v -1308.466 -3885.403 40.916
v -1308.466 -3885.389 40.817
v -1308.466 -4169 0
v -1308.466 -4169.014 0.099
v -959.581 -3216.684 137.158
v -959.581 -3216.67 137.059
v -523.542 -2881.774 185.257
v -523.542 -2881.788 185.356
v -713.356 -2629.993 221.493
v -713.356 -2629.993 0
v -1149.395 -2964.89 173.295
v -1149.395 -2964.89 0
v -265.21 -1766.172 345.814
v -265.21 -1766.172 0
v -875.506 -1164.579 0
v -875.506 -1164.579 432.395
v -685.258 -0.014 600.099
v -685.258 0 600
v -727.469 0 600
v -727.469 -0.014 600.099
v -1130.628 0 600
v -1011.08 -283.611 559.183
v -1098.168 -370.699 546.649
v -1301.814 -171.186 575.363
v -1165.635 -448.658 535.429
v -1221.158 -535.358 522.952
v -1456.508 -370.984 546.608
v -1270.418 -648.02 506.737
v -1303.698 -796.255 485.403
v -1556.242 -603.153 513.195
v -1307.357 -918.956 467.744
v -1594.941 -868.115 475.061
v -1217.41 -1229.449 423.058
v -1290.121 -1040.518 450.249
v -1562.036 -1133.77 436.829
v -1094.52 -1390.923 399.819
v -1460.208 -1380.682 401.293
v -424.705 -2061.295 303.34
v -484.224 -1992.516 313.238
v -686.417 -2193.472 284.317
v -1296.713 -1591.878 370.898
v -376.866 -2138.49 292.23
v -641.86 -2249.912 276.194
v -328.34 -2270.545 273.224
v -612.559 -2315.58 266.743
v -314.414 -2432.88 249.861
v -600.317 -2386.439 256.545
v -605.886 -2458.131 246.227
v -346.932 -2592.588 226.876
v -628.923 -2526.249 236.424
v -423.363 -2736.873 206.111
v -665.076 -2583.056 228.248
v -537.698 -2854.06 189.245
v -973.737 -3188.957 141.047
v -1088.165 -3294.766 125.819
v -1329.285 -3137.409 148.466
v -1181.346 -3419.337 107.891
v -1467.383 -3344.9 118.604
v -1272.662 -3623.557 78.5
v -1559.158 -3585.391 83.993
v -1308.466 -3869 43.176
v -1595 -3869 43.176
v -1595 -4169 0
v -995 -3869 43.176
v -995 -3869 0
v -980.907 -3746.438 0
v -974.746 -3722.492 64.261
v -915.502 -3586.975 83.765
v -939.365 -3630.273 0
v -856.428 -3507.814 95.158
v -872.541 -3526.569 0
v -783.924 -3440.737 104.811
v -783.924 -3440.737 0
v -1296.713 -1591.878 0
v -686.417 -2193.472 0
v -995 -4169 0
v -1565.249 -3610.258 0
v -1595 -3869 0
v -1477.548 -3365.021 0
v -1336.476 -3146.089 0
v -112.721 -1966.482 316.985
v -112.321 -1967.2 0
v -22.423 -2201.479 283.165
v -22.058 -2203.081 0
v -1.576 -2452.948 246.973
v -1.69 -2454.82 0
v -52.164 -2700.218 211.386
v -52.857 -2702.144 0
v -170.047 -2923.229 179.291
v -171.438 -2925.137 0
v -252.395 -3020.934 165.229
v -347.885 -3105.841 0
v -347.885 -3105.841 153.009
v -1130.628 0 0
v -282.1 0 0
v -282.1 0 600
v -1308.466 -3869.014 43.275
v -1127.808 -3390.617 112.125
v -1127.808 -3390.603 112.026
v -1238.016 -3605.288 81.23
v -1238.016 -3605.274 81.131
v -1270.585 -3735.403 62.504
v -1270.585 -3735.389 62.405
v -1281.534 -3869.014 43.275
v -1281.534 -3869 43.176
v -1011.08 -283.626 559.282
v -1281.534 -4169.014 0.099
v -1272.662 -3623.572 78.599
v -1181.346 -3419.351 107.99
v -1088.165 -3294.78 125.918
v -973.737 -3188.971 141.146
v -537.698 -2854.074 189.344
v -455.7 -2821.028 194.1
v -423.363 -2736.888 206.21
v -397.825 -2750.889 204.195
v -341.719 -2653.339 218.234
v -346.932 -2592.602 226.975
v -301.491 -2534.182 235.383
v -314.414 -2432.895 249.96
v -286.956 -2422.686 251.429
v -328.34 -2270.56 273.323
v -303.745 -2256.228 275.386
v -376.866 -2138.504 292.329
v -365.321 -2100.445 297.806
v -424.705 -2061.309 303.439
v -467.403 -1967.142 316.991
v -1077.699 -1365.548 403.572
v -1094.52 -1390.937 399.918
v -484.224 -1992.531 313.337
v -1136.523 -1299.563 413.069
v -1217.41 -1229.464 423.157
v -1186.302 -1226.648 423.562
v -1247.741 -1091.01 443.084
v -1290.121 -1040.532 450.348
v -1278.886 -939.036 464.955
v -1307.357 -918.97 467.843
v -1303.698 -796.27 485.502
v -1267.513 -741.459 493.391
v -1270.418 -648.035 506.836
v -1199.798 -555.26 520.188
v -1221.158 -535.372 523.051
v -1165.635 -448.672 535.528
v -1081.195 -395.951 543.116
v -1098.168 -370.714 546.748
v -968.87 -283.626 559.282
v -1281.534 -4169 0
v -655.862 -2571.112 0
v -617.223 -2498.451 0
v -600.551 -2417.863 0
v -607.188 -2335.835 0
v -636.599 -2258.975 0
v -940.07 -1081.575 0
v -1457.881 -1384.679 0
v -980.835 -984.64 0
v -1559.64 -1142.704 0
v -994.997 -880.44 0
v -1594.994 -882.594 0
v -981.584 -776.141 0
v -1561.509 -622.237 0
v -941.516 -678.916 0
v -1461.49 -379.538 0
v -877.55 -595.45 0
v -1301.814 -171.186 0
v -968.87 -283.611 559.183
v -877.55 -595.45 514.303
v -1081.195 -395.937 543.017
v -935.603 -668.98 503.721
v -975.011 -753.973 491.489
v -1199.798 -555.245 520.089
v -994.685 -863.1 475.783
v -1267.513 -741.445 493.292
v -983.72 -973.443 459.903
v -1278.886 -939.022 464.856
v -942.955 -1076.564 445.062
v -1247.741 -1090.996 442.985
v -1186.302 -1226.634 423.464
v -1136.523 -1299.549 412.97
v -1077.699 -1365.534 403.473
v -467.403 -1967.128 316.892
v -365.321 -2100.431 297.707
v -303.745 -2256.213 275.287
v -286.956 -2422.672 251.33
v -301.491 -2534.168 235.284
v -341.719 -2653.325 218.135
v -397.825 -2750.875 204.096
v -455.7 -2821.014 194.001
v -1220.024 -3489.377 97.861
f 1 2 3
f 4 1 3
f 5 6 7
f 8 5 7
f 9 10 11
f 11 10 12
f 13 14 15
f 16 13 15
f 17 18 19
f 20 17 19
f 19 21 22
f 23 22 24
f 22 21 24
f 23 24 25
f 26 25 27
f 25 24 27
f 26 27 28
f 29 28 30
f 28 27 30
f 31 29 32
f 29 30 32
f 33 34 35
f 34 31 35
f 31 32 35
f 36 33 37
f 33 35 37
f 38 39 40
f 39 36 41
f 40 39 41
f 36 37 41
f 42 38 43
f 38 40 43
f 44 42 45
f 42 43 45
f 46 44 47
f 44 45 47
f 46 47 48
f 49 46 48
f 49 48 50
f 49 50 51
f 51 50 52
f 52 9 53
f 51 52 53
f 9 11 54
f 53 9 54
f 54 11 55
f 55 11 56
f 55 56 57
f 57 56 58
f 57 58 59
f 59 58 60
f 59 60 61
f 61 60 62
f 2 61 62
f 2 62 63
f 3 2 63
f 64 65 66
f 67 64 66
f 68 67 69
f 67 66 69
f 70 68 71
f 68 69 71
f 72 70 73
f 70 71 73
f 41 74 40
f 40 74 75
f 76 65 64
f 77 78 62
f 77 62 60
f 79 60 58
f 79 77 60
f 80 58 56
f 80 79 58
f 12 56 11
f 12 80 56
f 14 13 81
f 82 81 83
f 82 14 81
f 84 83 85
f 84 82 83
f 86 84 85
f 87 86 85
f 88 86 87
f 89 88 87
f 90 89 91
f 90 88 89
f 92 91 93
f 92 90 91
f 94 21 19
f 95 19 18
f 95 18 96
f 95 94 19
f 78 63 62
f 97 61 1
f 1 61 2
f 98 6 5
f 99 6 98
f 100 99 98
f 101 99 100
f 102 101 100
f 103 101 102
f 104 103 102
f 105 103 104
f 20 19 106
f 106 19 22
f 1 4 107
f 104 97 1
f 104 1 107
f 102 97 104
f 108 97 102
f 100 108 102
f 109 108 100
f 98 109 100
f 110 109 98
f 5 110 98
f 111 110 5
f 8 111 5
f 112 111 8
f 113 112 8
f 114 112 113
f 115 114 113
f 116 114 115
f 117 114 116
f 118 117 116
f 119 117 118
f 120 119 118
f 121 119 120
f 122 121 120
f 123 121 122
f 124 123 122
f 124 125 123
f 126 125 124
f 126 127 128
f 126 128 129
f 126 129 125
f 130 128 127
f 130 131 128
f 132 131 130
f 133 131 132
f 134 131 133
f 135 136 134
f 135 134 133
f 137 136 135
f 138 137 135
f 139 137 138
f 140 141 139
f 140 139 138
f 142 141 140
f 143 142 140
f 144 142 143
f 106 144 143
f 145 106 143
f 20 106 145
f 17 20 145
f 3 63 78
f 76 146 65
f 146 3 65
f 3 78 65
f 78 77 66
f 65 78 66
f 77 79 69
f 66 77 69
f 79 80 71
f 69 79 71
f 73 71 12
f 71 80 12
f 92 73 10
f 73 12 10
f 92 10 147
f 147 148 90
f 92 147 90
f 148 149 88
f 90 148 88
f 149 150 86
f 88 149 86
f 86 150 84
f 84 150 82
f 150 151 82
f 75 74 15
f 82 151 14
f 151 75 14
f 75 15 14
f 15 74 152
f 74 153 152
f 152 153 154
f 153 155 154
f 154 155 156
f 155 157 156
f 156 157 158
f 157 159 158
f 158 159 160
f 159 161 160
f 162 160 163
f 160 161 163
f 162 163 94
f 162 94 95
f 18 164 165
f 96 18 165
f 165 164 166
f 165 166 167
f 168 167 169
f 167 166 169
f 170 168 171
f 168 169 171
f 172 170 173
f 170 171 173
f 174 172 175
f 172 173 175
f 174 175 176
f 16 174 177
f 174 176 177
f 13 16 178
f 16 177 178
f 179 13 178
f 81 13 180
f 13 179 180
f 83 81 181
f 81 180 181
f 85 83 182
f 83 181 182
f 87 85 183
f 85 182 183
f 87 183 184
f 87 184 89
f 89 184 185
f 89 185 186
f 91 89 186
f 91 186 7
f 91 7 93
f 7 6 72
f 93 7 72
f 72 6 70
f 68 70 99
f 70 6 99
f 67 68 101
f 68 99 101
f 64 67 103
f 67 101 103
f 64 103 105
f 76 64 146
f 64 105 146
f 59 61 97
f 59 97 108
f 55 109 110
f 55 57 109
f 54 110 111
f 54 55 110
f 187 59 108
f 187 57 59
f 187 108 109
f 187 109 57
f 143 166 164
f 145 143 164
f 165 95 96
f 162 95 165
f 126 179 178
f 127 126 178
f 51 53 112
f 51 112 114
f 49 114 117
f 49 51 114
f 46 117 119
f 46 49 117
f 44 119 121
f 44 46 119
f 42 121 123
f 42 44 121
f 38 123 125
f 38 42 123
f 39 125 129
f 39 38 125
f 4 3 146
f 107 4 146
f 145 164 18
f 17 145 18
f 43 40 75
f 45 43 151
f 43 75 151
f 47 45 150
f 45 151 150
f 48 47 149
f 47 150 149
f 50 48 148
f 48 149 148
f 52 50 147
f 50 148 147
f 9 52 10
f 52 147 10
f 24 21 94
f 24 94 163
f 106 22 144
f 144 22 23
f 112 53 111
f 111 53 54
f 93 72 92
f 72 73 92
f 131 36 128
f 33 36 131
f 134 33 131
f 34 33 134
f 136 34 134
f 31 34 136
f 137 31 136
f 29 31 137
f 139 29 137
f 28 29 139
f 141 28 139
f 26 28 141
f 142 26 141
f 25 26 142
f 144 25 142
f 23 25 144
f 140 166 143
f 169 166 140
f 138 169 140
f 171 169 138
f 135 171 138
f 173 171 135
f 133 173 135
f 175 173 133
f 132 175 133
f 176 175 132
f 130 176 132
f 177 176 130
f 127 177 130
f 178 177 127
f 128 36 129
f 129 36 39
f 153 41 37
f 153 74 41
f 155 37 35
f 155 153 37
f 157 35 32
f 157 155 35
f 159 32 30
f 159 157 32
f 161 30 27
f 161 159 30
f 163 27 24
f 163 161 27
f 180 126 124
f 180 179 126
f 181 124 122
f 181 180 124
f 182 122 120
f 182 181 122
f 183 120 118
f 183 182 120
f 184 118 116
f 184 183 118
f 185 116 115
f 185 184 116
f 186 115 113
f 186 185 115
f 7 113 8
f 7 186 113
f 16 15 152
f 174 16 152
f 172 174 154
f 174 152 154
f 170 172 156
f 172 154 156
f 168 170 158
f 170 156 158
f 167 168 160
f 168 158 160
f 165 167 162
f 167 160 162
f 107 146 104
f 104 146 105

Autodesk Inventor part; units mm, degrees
ref_plane "YZ Plane" through (0, 0, 0) normal (1, 0, 0) x (0, 1, 0)
ref_plane "XZ Plane" through (0, 0, 0) normal (0, 1, 0) x (-1, 0, 0)
ref_plane "XY Plane" through (0, 0, 0) normal (0, 0, 1) x (1, 0, 0)
sketch "スケッチ1" plane through (0, 0, 0) normal (0, 0, 1) x (1, 0, 0)
  line L0 (1130.627776, 0) -> (1301.813888, -171.186112)
  line L1 (282.099639, 0) -> (877.549819, -595.450181)
  line L2 (1130.627776, 0) -> (282.099639, 0)
  circle A0 centre (594, -879) radius 1001 construction
  arc A1 (1296.712925, -1591.878353) -> (1296.712925, -1591.878353) centre (389.934597, -671.982591) ccw
  line L3 (1296.712925, -1591.878353) -> (686.416835, -2193.471806)
  circle A2 centre (890, -2400) radius 290 construction
  line L4 (713.355666, -2629.992999) -> (1149.394967, -2964.889592)
  line L5 (1595, -4169) -> (1595, -3869)
  circle A3 centre (455, -3869) radius 1140 construction
  arc A4 (875.506376, -1164.578641) -> (877.549819, -595.450181) centre (594, -879) ccw construction
  circle A5 centre (890, -2400) radius 890 construction
  circle A6 centre (455, -3869) radius 540 construction
  line L6 (783.923932, -3440.737175) -> (347.884631, -3105.840582)
  line L7 (265.210287, -1766.172094) -> (875.506376, -1164.578641)
  line L8 (995, -3869) -> (995, -4169)
  line L9 (995, -4169) -> (1595, -4169)
  arc A7 (1296.712925, -1591.878353) -> (1301.813888, -171.186112) centre (594, -879) ccw
  arc A8 (265.210287, -1766.172094) -> (347.884631, -3105.840582) centre (890, -2400) ccw
  arc A9 (686.416835, -2193.471806) -> (713.355666, -2629.992999) centre (890, -2400) ccw
  arc A10 (875.506376, -1164.578641) -> (877.549819, -595.450181) centre (594, -879) ccw
  arc A11 (995, -3869) -> (783.923932, -3440.737175) centre (455, -3869) ccw
  arc A12 (1595, -3869) -> (1149.394967, -2964.889592) centre (455, -3869) ccw
  line L10 (0, -4169) -> (1595, -4169) construction
  line L11 (1595, -4169) -> (1595, -4131.300846) construction
  line L12 (0, -4169) -> (0, 0) construction
  line L13 (0, 0) -> (1595, 0) construction
  line L14 (-1130.627776, 0) -> (-1301.813888, -171.186112)
  line L15 (-282.099639, 0) -> (-877.549819, -595.450181)
  line L16 (-1130.627776, 0) -> (-282.099639, 0)
  arc A13 (-1296.712925, -1591.878353) -> (-1296.712925, -1591.878353) centre (-389.934597, -671.982591) ccw
  line L17 (-1296.712925, -1591.878353) -> (-686.416835, -2193.471806)
  line L18 (-713.355666, -2629.992999) -> (-1149.394967, -2964.889592)
  line L19 (-1595, -4169) -> (-1595, -3869)
  line L20 (-783.923932, -3440.737175) -> (-347.884631, -3105.840582)
  line L21 (-265.210287, -1766.172094) -> (-875.506376, -1164.578641)
  line L22 (-995, -3869) -> (-995, -4169)
  line L23 (-995, -4169) -> (-1595, -4169)
  arc A14 (-1301.813888, -171.186112) -> (-1296.712925, -1591.878353) centre (-594, -879) ccw
  arc A15 (-347.884631, -3105.840582) -> (-265.210287, -1766.172094) centre (-890, -2400) ccw
  arc A16 (-713.355666, -2629.992999) -> (-686.416835, -2193.471806) centre (-890, -2400) ccw
  arc A17 (-877.549819, -595.450181) -> (-875.506376, -1164.578641) centre (-594, -879) ccw
  arc A18 (-783.923932, -3440.737175) -> (-995, -3869) centre (-455, -3869) ccw
  arc A19 (-1149.394967, -2964.889592) -> (-1595, -3869) centre (-455, -3869) ccw
  line L24 (0, -4169) -> (-1595, -4169) construction
  line L25 (-1595, -4169) -> (-1595, -4131.300846) construction
  line L26 (1595, -4169) -> (1595, 0) construction
  arc A20 (1120.235186, -2943.223489) -> (532.764288, -2869.555797) centre (890, -2400) ccw
  arc A21 (1086.10965, -1378.228497) -> (1089.681854, -383.318146) centre (594, -879) ccw
  line L27 (332.920262, 373.443445) -> (1089.681854, -383.318146)
  line L28 (475.813561, -1979.82195) -> (1086.10965, -1378.228497)
  arc A22 (1295, -3933.855609) -> (965.120487, -3198.490239) centre (455, -3869) ccw
  line L29 (1295, -4169) -> (1295, -3933.855609)
  line L30 (965.120487, -3198.490239) -> (532.764288, -2869.555797)
  dimension "d1" = 1080
  dimension "d2" = 2280
  dimension "d3" = 580
  dimension "d4" = 1780
  dimension "d5" = 802
  dimension "d6" = 2002
  dimension "d16" = 45
  dimension "d19" = 1140
  dimension "d20" = 4169
  dimension "d21" = 0
  dimension "d22" = 600
  dimension "d35" = 3290
  dimension "d36" = 1769
  dimension "d37" = 300
  dimension "d39" = 300
  dimension "d41" = 1595
  dimension "d43" = 1001
  dimension "d55" = 1180
  dimension "d58" = 1402
  dimension "d59" = 300
  dimension "d60" = 1685
  dimension "d61" = 300
extrude "押し出し1" add sketch "スケッチ1" along normal blind 600 contours L16 L15 A17 A1 | A1 A17 L21 A15 A13 A14 L14 L16 | A13 A15 L20 A18 L22 L23 L19 A19 L18 A16 L17 | L21 A15 A1
sketch "スケッチ2" plane through (0, 0, 0) normal (1, 0, 0) x (0, 1, 0)
  line L0 (0, 0) -> (0, 600)
  line L1 (0, 600) -> (-4169, 0)
  line L2 (-4169, 0) -> (0, 0)
  dimension "d26" = 600
  dimension "d27" = 4169
extrude "押し出し2" cut sketch "スケッチ2" along normal through all both and the other way through all keep common part
sketch "スケッチ3" plane through (-1130.627776, 0, 600) normal (0, -0.1424517, 0.9898018) x (1, 0, 0)
  line L0 (0, 0) -> (-171.186112, -172.949897)
  ellipse E0 centre (536.627776, -888.056617) end of major axis (536.627776, 123.257005) minor radius 1001 (-171.186112, -172.949897) -> (-166.085149, -1608.279982) ccw
  line L1 (-166.085149, -1608.279982) -> (444.210941, -2216.071844)
  ellipse E1 centre (240.627776, -2424.727964) end of major axis (240.627776, -2131.740002) minor radius 290 (417.27211, -2657.090654) -> (444.210941, -2216.071844) ccw
  line L2 (417.27211, -2657.090654) -> (-18.767191, -2995.437793)
  ellipse E2 centre (675.627776, -3908.863539) end of major axis (675.627776, -2757.117756) minor radius 1140 (-18.767191, -2995.437793) -> (-464.372224, -3908.863539) ccw
  line L3 (-464.372224, -3908.863539) -> (-464.372224, -4211.954534)
  line L4 (-464.372224, -4211.954534) -> (135.627776, -4211.954534)
  line L5 (135.627776, -4211.954534) -> (135.627776, -3908.863539)
  ellipse E3 centre (675.627776, -3908.863539) end of major axis (675.627776, -4454.427331) minor radius 540 (346.703844, -3476.188186) -> (135.627776, -3908.863539) ccw
  line L6 (346.703844, -3476.188186) -> (782.743145, -3137.841046)
  ellipse E4 centre (240.627776, -2424.727964) end of major axis (240.627776, -3323.897918) minor radius 890 (782.743145, -3137.841046) -> (865.417489, -1784.369528) ccw
  line L7 (865.417489, -1784.369528) -> (255.1214, -1176.577665)
  ellipse E5 centre (536.627776, -888.056617) end of major axis (536.627776, -1293.188248) minor radius 401 (253.077957, -601.585294) -> (255.1214, -1176.577665) ccw
  line L8 (253.077957, -601.585294) -> (848.528137, 0)
  line L9 (848.528137, 0) -> (0, 0)
  line L10 (32.459504, -374.518685) -> (119.54728, -286.533616)
  line L11 (119.54728, -286.533616) -> (161.757904, -286.533616)
  line L12 (161.757904, -286.533616) -> (49.432341, -400.016505)
  line L13 (52.928503, -1379.603638) -> (663.224592, -1987.395501)
  line L14 (607.085651, -2911.465345) -> (171.04635, -3249.812485)
  line L15 (-150.90584, -3908.863539) -> (-150.90584, -3925.420918)
  line L16 (-150.90584, -3925.420918) -> (-177.838608, -3925.420918)
  line L17 (-177.838608, -3925.420918) -> (-177.838608, -3908.863539)
  line L18 (156.890303, -3221.813494) -> (592.929604, -2883.466355)
  line L19 (646.403838, -2013.045871) -> (36.107748, -1405.254009)
  line L20 (-177.838608, -3925.420918) -> (-177.838608, -4211.954534)
  line L21 (-150.90584, -3925.420918) -> (-150.90584, -4211.954534)
  line L22 (119.54728, -286.533616) -> (403.158757, 0)
  line L23 (161.757904, -286.533616) -> (445.369381, 0)
  line L24 (135.627776, -4196.954534) -> (-464.372224, -4196.954534)
  circle A0 centre (536.627776, -888.056617) radius 687.533623
  circle A1 centre (536.627776, -888.056617) radius 714.466404
  circle A2 centre (536.627776, -888.056617) radius 702.533623
  line L25 (536.627776, -888.056617) -> (-165.905847, -888.056617)
  spline S0 degree 5 poles (49.432313, -400.016478) (6.077227, -443.818375) (-32.384649, -492.463466) (-65.245601, -545.209886) (-132.816663, -686.686848) (-159.115063, -842.537878) (-158.773953, -938.579626) (-131.367798, -1094.241054) (-62.788599, -1235.233354) (-29.550818, -1287.744456) (9.259286, -1336.113556) (52.928475, -1379.603666) knots 0 0 0 0 0 0 0.28340783 0.28340783 0.28340783 0.71658777 0.71658777 0.71658777 1 1 1 1 1 1
  spline S1 degree 5 poles (663.224587, -1987.395506) (689.075742, -2013.14062) (712.995547, -2040.825086) (734.798846, -2070.246947) (790.871239, -2159.036636) (827.290897, -2258.293566) (841.913972, -2325.841291) (852.274256, -2463.111073) (825.311564, -2598.10068) (802.618247, -2663.275174) (754.460895, -2757.168939) (688.062902, -2838.256606) (662.887271, -2864.702619) (635.825083, -2889.164768) (607.085644, -2911.465337) knots 0 0 0 0 0 0 0.17436211 0.17436211 0.17436211 0.50050025 0.50050025 0.50050025 0.826151 0.826151 0.826151 1 1 1 1 1 1
  spline S2 degree 5 poles (171.046331, -3249.81246) (111.042432, -3296.372766) (56.382455, -3349.819709) (8.104424, -3409.315106) (-74.022271, -3538.251051) (-125.0897, -3682.339847) (-142.300458, -3756.981031) (-150.905856, -3832.922299) (-150.905852, -3908.863539) knots 0 0 0 0 0 0 0.50002711 0.50002711 0.50002711 1 1 1 1 1 1
  spline S3 degree 5 poles (-177.8386, -3908.863539) (-177.838569, -3829.462861) (-168.853548, -3750.06212) (-150.883663, -3672.016939) (-97.718356, -3521.8667) (-12.219082, -3387.492156) (37.862436, -3325.6829) (94.589087, -3270.156386) (156.890287, -3221.813474) knots 0 0 0 0 0 0 0.50171698 0.50171698 0.50171698 1 1 1 1 1 1
  spline S4 degree 5 poles (592.929643, -2883.466405) (637.116056, -2849.179555) (677.147225, -2809.537849) (712.168719, -2765.225935) (786.283528, -2643.702753) (821.3073, -2504.348583) (826.632167, -2417.149407) (808.848433, -2274.604137) (750.159778, -2144.96338) (720.849211, -2096.723221) (686.010859, -2052.490454) (646.403872, -2013.045836) knots 0 0 0 0 0 0 0.28358577 0.28358577 0.28358577 0.71657004 0.71657004 0.71657004 1 1 1 1 1 1
  spline S5 degree 5 poles (36.107752, -1405.254005) (7.864752, -1377.12687) (-18.430404, -1347.043832) (-42.604908, -1315.192514) (-105.462623, -1219.337185) (-148.735449, -1112.473232) (-167.867897, -1039.634178) (-187.271249, -890.697388) (-168.925567, -741.626429) (-150.309509, -668.648054) (-107.794348, -561.468167) (-45.617295, -465.156101) (-21.667813, -433.127656) (4.41493, -402.852244) (32.459508, -374.518689) knots 0 0 0 0 0 0 0.17426528 0.17426528 0.17426528 0.49997454 0.49997454 0.49997454 0.82570808 0.82570808 0.82570808 1 1 1 1 1 1
  point P0 (1130.627776, -85.471008)
  dimension "d31" = 30
  dimension "d32" = 15
  dimension "d62" = 1428.93281
  dimension "d63" = 15
sketch "スケッチ3 outline for 押し出し3" plane through (-1130.627776, 0, 600) normal (0, -0.1424517, 0.9898018) x (1, 0, 0)
  line L0 (403.158757, 0) -> (119.54728, -286.533616)
  line L1 (119.54728, -286.533616) -> (32.459508, -374.518689)
  spline S0 degree 5 poles (36.107752, -1405.254005) (7.864752, -1377.12687) (-18.430404, -1347.043832) (-42.604908, -1315.192514) (-105.462623, -1219.337185) (-148.735449, -1112.473232) (-167.867897, -1039.634178) (-187.271249, -890.697388) (-168.925567, -741.626429) (-150.309509, -668.648054) (-107.794348, -561.468167) (-45.617295, -465.156101) (-21.667813, -433.127656) (4.41493, -402.852244) (32.459508, -374.518689) knots 0 0 0 0 0 0 0.17426528 0.17426528 0.17426528 0.49997454 0.49997454 0.49997454 0.82570808 0.82570808 0.82570808 1 1 1 1 1 1
  line L2 (36.107752, -1405.254005) -> (646.403838, -2013.045871)
  spline S1 degree 5 poles (592.929643, -2883.466405) (637.116056, -2849.179555) (677.147225, -2809.537849) (712.168719, -2765.225935) (786.283528, -2643.702753) (821.3073, -2504.348583) (826.632167, -2417.149407) (808.848433, -2274.604137) (750.159778, -2144.96338) (720.849211, -2096.723221) (686.010859, -2052.490454) (646.403838, -2013.045871) knots 0 0 0 0 0 0 0.28358577 0.28358577 0.28358577 0.71657004 0.71657004 0.71657004 1 1 1 1 1 1
  line L3 (592.929643, -2883.466405) -> (156.890303, -3221.813494)
  spline S2 degree 5 poles (-177.8386, -3908.863539) (-177.838569, -3829.462861) (-168.853548, -3750.06212) (-150.883663, -3672.016939) (-97.718356, -3521.8667) (-12.219082, -3387.492156) (37.862436, -3325.6829) (94.589087, -3270.156386) (156.890303, -3221.813494) knots 0 0 0 0 0 0 0.50171698 0.50171698 0.50171698 1 1 1 1 1 1
  line L4 (-177.8386, -3908.863539) -> (-177.838608, -3925.420918)
  line L5 (-177.838608, -3925.420918) -> (-177.838608, -4211.954534)
  line L6 (-177.838608, -4211.954534) -> (-150.90584, -4211.954534)
  line L7 (-150.90584, -4211.954534) -> (-150.90584, -3908.863539)
  spline S3 degree 5 poles (171.046331, -3249.81246) (111.042432, -3296.372766) (56.382455, -3349.819709) (8.104424, -3409.315106) (-74.022271, -3538.251051) (-125.0897, -3682.339847) (-142.300458, -3756.981031) (-150.905856, -3832.922299) (-150.90584, -3908.863539) knots 0 0 0 0 0 0 0.50002711 0.50002711 0.50002711 1 1 1 1 1 1
  line L8 (171.046331, -3249.81246) -> (607.085651, -2911.465345)
  spline S4 degree 5 poles (663.224587, -1987.395506) (689.075742, -2013.14062) (712.995547, -2040.825086) (734.798846, -2070.246947) (790.871239, -2159.036636) (827.290897, -2258.293566) (841.913972, -2325.841291) (852.274256, -2463.111073) (825.311564, -2598.10068) (802.618247, -2663.275174) (754.460895, -2757.168939) (688.062902, -2838.256606) (662.887271, -2864.702619) (635.825083, -2889.164768) (607.085651, -2911.465345) knots 0 0 0 0 0 0 0.17436211 0.17436211 0.17436211 0.50050025 0.50050025 0.50050025 0.826151 0.826151 0.826151 1 1 1 1 1 1
  line L9 (663.224587, -1987.395506) -> (52.928503, -1379.603638)
  spline S5 degree 5 poles (49.432313, -400.016478) (6.077227, -443.818375) (-32.384649, -492.463466) (-65.245601, -545.209886) (-132.816663, -686.686848) (-159.115063, -842.537878) (-158.773953, -938.579626) (-131.367798, -1094.241054) (-62.788599, -1235.233354) (-29.550818, -1287.744456) (9.259286, -1336.113556) (52.928503, -1379.603638) knots 0 0 0 0 0 0 0.28340783 0.28340783 0.28340783 0.71658777 0.71658777 0.71658777 1 1 1 1 1 1
  line L10 (49.432313, -400.016478) -> (161.757904, -286.533616)
  line L11 (161.757904, -286.533616) -> (445.369381, 0)
  line L12 (445.369381, 0) -> (403.158757, 0)
extrude "押し出し3" add sketch "スケッチ3 outline for 押し出し3" along normal blind 0.1
sketch "スケッチ5" plane through (0, 0, 0) normal (0, 0, 1) x (1, 0, 0)
  line L0 (-1308.466384, -3869.014245) -> (-1308.466384, -4169.014245)
  line L1 (-1308.466384, -4169.014245) -> (-1281.533616, -4169.014245)
  line L2 (-1281.533616, -4169.014245) -> (-1281.533616, -3869.014245)
  line L3 (-959.581426, -3216.684354) -> (-523.542125, -2881.78776)
  line L4 (-467.403184, -1967.141804) -> (-1077.699273, -1365.548351)
  line L5 (-1081.195435, -395.951285) -> (-685.258395, -0.014245)
  line L6 (-685.258395, -0.014245) -> (-727.469019, -0.014245)
  line L7 (-727.469019, -0.014245) -> (-1098.168272, -370.713498)
  line L8 (-1094.520028, -1390.937133) -> (-484.223938, -1992.530586)
  line L9 (-537.698172, -2854.07431) -> (-973.737473, -3188.970904)
  line L10 (-1081.195435, -395.951285) -> (-598.117629, -879.029091)
  line L11 (-598.117629, -879.029091) -> (-1077.699273, -1365.548351)
  line L12 (-598.117629, -879.029091) -> (-1281.52915, -881.482864)
  line L13 (-1281.52915, -881.482864) -> (-1308.461836, -881.579565)
  line L14 (-484.223938, -1992.530586) -> (-886.199659, -2400.321278)
  line L15 (-886.199659, -2400.321278) -> (-537.698172, -2854.07431)
  line L16 (-886.199659, -2400.321278) -> (-314.576724, -2435.597581)
  line L17 (-314.576724, -2435.597581) -> (-287.672956, -2437.257881)
  line L18 (-1281.533616, -3869.014245) -> (-458.564526, -3869.014245)
  line L19 (-458.564526, -3869.014245) -> (-959.581426, -3216.684354)
  line L20 (-458.564526, -3869.014245) -> (-1196.563908, -3505.279644)
  line L21 (-1196.563908, -3505.279644) -> (-1221.734569, -3492.873888)
  point P0 (0, 0)
  point P1 (-1294.995493, -881.531215)
  point P2 (-301.12484, -2436.427731)
  point P3 (-1209.149239, -3499.076766)
  point P4 (536.976093, 8076.719831)
  dimension "d44" = 669.93748
  dimension "d45" = 1732.58651
  dimension "d46" = 3287.48303
sketch "スケッチ6" plane through (0, 0, 0) normal (1, 0, 0) x (0, 1, 0)
  line L0 (-3869.014245, 43.274802) -> (-4169.014245, 0.09898)
  line L1 (-4169.014245, 0.09898) -> (-3869.014245, 43.274802)
  line L2 (-3869.014245, 43.274802) -> (-3216.684354, 137.157732)
  line L3 (-3216.684354, 137.157732) -> (-2881.78776, 185.35585)
  line L4 (-2881.78776, 185.35585) -> (-1967.141804, 316.991152)
  line L5 (-1967.141804, 316.991152) -> (-1365.548351, 403.572124)
  line L6 (-1365.548351, 403.572124) -> (-395.951285, 543.115957)
  line L7 (-395.951285, 543.115957) -> (-0.014245, 600.09898)
  line L8 (-0.014245, 600.09898) -> (-370.713498, 546.748164)
  line L9 (-370.713498, 546.748164) -> (-1390.937133, 399.918186)
  line L10 (-1390.937133, 399.918186) -> (-1992.530586, 313.337214)
  line L11 (-1992.530586, 313.337214) -> (-2854.07431, 189.344353)
  line L12 (-2854.07431, 189.344353) -> (-3188.970904, 141.146235)
  line L13 (-3188.970904, 141.146235) -> (-3869.014245, 43.274802)
  point P0 (0, 0)
  point P1 (-3499.076766, 96.515984)
  point P2 (-2436.427731, 249.451801)
  point P3 (-881.531215, 473.231582)
  dimension "d47" = 669.93748
  dimension "d48" = 1732.58651
  dimension "d49" = 3287.48303
  dimension "d50" = 96.417
  dimension "d51" = 249.35282
  dimension "d52" = 473.1326
sketch "スケッチ7" plane through (-1130.627776, -0.014245, 600.09898) normal (0, -0.1424517, 0.9898018) x (1, 0, 0)
  line L0 (-177.838608, -3908.863539) -> (-177.838608, -4211.954534)
  line L1 (-177.838608, -4211.954534) -> (-150.90584, -4211.954534)
  line L2 (-150.90584, -4211.954534) -> (-150.90584, -3908.863539)
  line L3 (171.04635, -3249.812485) -> (607.085651, -2911.465345)
  line L4 (663.224592, -1987.395501) -> (52.928503, -1379.603638)
  line L5 (49.432341, -400.016505) -> (445.369381, 0)
  line L6 (445.369381, 0) -> (403.158757, 0)
  line L7 (403.158757, 0) -> (32.459504, -374.518685)
  line L8 (36.107748, -1405.254009) -> (646.403838, -2013.045871)
  line L9 (592.929604, -2883.466355) -> (156.890303, -3221.813494)
  line L10 (-150.90584, -3908.863539) -> (-150.90584, -4211.954534)
  line L11 (-150.90584, -4211.954534) -> (135.627776, -4211.954534)
  line L12 (135.627776, -4211.954534) -> (135.627776, -3908.863539)
  ellipse E0 centre (675.627776, -3908.863539) end of major axis (675.627776, -4454.427331) minor radius 540 (346.703844, -3476.188186) -> (135.627776, -3908.863539) ccw
  line L13 (346.703844, -3476.188186) -> (782.743145, -3137.841046)
  ellipse E1 centre (240.627776, -2424.727964) end of major axis (240.627776, -3323.897918) minor radius 890 (782.743145, -3137.841046) -> (865.417489, -1784.369528) ccw
  line L14 (865.417489, -1784.369528) -> (255.1214, -1176.577665)
  ellipse E2 centre (536.627776, -888.056617) end of major axis (536.627776, -1293.188248) minor radius 401 (253.077957, -601.585294) -> (255.1214, -1176.577665) ccw
  line L15 (253.077957, -601.585294) -> (848.528137, 0)
  line L16 (848.528137, 0) -> (445.369381, 0)
  line L17 (445.369381, 0) -> (49.432341, -400.016505)
  line L18 (52.928503, -1379.603638) -> (663.224592, -1987.395501)
  line L19 (607.085651, -2911.465345) -> (171.04635, -3249.812485)
  line L20 (536.627776, -888.056617) -> (-363.574656, -888.056617)
  line L21 (240.627776, -2424.727964) -> (865.417489, -2424.727964)
  circle A0 centre (675.627776, -3908.863539) radius 842.5
  circle A1 centre (240.627776, -2424.727964) radius 590
  circle A2 centre (536.627776, -888.056617) radius 701
  line L22 (675.627776, -3908.863539) -> (-164.372224, -3844.00793)
  line L23 (675.627776, -3908.863539) -> (52.620076, -3341.706016)
  circle A3 centre (536.627776, -888.056617) radius 714.466403
  circle A4 centre (536.627776, -888.056617) radius 687.533623
  point P0 (1130.627776, -85.471008)
  point P1 (-164.372224, -888.056617)
  point P2 (830.627776, -2424.727964)
  point P3 (-164.372224, -888.056617)
  point P4 (830.627776, -2424.727964)
  dimension "d56" = 1180
  dimension "d57" = 1402
  dimension "d54" = 1685
equation "\"d47\" = d44"
equation "\"d48\" = d45"
equation "\"d49\" = d46"
properties part number "Down Hill_赤2"
